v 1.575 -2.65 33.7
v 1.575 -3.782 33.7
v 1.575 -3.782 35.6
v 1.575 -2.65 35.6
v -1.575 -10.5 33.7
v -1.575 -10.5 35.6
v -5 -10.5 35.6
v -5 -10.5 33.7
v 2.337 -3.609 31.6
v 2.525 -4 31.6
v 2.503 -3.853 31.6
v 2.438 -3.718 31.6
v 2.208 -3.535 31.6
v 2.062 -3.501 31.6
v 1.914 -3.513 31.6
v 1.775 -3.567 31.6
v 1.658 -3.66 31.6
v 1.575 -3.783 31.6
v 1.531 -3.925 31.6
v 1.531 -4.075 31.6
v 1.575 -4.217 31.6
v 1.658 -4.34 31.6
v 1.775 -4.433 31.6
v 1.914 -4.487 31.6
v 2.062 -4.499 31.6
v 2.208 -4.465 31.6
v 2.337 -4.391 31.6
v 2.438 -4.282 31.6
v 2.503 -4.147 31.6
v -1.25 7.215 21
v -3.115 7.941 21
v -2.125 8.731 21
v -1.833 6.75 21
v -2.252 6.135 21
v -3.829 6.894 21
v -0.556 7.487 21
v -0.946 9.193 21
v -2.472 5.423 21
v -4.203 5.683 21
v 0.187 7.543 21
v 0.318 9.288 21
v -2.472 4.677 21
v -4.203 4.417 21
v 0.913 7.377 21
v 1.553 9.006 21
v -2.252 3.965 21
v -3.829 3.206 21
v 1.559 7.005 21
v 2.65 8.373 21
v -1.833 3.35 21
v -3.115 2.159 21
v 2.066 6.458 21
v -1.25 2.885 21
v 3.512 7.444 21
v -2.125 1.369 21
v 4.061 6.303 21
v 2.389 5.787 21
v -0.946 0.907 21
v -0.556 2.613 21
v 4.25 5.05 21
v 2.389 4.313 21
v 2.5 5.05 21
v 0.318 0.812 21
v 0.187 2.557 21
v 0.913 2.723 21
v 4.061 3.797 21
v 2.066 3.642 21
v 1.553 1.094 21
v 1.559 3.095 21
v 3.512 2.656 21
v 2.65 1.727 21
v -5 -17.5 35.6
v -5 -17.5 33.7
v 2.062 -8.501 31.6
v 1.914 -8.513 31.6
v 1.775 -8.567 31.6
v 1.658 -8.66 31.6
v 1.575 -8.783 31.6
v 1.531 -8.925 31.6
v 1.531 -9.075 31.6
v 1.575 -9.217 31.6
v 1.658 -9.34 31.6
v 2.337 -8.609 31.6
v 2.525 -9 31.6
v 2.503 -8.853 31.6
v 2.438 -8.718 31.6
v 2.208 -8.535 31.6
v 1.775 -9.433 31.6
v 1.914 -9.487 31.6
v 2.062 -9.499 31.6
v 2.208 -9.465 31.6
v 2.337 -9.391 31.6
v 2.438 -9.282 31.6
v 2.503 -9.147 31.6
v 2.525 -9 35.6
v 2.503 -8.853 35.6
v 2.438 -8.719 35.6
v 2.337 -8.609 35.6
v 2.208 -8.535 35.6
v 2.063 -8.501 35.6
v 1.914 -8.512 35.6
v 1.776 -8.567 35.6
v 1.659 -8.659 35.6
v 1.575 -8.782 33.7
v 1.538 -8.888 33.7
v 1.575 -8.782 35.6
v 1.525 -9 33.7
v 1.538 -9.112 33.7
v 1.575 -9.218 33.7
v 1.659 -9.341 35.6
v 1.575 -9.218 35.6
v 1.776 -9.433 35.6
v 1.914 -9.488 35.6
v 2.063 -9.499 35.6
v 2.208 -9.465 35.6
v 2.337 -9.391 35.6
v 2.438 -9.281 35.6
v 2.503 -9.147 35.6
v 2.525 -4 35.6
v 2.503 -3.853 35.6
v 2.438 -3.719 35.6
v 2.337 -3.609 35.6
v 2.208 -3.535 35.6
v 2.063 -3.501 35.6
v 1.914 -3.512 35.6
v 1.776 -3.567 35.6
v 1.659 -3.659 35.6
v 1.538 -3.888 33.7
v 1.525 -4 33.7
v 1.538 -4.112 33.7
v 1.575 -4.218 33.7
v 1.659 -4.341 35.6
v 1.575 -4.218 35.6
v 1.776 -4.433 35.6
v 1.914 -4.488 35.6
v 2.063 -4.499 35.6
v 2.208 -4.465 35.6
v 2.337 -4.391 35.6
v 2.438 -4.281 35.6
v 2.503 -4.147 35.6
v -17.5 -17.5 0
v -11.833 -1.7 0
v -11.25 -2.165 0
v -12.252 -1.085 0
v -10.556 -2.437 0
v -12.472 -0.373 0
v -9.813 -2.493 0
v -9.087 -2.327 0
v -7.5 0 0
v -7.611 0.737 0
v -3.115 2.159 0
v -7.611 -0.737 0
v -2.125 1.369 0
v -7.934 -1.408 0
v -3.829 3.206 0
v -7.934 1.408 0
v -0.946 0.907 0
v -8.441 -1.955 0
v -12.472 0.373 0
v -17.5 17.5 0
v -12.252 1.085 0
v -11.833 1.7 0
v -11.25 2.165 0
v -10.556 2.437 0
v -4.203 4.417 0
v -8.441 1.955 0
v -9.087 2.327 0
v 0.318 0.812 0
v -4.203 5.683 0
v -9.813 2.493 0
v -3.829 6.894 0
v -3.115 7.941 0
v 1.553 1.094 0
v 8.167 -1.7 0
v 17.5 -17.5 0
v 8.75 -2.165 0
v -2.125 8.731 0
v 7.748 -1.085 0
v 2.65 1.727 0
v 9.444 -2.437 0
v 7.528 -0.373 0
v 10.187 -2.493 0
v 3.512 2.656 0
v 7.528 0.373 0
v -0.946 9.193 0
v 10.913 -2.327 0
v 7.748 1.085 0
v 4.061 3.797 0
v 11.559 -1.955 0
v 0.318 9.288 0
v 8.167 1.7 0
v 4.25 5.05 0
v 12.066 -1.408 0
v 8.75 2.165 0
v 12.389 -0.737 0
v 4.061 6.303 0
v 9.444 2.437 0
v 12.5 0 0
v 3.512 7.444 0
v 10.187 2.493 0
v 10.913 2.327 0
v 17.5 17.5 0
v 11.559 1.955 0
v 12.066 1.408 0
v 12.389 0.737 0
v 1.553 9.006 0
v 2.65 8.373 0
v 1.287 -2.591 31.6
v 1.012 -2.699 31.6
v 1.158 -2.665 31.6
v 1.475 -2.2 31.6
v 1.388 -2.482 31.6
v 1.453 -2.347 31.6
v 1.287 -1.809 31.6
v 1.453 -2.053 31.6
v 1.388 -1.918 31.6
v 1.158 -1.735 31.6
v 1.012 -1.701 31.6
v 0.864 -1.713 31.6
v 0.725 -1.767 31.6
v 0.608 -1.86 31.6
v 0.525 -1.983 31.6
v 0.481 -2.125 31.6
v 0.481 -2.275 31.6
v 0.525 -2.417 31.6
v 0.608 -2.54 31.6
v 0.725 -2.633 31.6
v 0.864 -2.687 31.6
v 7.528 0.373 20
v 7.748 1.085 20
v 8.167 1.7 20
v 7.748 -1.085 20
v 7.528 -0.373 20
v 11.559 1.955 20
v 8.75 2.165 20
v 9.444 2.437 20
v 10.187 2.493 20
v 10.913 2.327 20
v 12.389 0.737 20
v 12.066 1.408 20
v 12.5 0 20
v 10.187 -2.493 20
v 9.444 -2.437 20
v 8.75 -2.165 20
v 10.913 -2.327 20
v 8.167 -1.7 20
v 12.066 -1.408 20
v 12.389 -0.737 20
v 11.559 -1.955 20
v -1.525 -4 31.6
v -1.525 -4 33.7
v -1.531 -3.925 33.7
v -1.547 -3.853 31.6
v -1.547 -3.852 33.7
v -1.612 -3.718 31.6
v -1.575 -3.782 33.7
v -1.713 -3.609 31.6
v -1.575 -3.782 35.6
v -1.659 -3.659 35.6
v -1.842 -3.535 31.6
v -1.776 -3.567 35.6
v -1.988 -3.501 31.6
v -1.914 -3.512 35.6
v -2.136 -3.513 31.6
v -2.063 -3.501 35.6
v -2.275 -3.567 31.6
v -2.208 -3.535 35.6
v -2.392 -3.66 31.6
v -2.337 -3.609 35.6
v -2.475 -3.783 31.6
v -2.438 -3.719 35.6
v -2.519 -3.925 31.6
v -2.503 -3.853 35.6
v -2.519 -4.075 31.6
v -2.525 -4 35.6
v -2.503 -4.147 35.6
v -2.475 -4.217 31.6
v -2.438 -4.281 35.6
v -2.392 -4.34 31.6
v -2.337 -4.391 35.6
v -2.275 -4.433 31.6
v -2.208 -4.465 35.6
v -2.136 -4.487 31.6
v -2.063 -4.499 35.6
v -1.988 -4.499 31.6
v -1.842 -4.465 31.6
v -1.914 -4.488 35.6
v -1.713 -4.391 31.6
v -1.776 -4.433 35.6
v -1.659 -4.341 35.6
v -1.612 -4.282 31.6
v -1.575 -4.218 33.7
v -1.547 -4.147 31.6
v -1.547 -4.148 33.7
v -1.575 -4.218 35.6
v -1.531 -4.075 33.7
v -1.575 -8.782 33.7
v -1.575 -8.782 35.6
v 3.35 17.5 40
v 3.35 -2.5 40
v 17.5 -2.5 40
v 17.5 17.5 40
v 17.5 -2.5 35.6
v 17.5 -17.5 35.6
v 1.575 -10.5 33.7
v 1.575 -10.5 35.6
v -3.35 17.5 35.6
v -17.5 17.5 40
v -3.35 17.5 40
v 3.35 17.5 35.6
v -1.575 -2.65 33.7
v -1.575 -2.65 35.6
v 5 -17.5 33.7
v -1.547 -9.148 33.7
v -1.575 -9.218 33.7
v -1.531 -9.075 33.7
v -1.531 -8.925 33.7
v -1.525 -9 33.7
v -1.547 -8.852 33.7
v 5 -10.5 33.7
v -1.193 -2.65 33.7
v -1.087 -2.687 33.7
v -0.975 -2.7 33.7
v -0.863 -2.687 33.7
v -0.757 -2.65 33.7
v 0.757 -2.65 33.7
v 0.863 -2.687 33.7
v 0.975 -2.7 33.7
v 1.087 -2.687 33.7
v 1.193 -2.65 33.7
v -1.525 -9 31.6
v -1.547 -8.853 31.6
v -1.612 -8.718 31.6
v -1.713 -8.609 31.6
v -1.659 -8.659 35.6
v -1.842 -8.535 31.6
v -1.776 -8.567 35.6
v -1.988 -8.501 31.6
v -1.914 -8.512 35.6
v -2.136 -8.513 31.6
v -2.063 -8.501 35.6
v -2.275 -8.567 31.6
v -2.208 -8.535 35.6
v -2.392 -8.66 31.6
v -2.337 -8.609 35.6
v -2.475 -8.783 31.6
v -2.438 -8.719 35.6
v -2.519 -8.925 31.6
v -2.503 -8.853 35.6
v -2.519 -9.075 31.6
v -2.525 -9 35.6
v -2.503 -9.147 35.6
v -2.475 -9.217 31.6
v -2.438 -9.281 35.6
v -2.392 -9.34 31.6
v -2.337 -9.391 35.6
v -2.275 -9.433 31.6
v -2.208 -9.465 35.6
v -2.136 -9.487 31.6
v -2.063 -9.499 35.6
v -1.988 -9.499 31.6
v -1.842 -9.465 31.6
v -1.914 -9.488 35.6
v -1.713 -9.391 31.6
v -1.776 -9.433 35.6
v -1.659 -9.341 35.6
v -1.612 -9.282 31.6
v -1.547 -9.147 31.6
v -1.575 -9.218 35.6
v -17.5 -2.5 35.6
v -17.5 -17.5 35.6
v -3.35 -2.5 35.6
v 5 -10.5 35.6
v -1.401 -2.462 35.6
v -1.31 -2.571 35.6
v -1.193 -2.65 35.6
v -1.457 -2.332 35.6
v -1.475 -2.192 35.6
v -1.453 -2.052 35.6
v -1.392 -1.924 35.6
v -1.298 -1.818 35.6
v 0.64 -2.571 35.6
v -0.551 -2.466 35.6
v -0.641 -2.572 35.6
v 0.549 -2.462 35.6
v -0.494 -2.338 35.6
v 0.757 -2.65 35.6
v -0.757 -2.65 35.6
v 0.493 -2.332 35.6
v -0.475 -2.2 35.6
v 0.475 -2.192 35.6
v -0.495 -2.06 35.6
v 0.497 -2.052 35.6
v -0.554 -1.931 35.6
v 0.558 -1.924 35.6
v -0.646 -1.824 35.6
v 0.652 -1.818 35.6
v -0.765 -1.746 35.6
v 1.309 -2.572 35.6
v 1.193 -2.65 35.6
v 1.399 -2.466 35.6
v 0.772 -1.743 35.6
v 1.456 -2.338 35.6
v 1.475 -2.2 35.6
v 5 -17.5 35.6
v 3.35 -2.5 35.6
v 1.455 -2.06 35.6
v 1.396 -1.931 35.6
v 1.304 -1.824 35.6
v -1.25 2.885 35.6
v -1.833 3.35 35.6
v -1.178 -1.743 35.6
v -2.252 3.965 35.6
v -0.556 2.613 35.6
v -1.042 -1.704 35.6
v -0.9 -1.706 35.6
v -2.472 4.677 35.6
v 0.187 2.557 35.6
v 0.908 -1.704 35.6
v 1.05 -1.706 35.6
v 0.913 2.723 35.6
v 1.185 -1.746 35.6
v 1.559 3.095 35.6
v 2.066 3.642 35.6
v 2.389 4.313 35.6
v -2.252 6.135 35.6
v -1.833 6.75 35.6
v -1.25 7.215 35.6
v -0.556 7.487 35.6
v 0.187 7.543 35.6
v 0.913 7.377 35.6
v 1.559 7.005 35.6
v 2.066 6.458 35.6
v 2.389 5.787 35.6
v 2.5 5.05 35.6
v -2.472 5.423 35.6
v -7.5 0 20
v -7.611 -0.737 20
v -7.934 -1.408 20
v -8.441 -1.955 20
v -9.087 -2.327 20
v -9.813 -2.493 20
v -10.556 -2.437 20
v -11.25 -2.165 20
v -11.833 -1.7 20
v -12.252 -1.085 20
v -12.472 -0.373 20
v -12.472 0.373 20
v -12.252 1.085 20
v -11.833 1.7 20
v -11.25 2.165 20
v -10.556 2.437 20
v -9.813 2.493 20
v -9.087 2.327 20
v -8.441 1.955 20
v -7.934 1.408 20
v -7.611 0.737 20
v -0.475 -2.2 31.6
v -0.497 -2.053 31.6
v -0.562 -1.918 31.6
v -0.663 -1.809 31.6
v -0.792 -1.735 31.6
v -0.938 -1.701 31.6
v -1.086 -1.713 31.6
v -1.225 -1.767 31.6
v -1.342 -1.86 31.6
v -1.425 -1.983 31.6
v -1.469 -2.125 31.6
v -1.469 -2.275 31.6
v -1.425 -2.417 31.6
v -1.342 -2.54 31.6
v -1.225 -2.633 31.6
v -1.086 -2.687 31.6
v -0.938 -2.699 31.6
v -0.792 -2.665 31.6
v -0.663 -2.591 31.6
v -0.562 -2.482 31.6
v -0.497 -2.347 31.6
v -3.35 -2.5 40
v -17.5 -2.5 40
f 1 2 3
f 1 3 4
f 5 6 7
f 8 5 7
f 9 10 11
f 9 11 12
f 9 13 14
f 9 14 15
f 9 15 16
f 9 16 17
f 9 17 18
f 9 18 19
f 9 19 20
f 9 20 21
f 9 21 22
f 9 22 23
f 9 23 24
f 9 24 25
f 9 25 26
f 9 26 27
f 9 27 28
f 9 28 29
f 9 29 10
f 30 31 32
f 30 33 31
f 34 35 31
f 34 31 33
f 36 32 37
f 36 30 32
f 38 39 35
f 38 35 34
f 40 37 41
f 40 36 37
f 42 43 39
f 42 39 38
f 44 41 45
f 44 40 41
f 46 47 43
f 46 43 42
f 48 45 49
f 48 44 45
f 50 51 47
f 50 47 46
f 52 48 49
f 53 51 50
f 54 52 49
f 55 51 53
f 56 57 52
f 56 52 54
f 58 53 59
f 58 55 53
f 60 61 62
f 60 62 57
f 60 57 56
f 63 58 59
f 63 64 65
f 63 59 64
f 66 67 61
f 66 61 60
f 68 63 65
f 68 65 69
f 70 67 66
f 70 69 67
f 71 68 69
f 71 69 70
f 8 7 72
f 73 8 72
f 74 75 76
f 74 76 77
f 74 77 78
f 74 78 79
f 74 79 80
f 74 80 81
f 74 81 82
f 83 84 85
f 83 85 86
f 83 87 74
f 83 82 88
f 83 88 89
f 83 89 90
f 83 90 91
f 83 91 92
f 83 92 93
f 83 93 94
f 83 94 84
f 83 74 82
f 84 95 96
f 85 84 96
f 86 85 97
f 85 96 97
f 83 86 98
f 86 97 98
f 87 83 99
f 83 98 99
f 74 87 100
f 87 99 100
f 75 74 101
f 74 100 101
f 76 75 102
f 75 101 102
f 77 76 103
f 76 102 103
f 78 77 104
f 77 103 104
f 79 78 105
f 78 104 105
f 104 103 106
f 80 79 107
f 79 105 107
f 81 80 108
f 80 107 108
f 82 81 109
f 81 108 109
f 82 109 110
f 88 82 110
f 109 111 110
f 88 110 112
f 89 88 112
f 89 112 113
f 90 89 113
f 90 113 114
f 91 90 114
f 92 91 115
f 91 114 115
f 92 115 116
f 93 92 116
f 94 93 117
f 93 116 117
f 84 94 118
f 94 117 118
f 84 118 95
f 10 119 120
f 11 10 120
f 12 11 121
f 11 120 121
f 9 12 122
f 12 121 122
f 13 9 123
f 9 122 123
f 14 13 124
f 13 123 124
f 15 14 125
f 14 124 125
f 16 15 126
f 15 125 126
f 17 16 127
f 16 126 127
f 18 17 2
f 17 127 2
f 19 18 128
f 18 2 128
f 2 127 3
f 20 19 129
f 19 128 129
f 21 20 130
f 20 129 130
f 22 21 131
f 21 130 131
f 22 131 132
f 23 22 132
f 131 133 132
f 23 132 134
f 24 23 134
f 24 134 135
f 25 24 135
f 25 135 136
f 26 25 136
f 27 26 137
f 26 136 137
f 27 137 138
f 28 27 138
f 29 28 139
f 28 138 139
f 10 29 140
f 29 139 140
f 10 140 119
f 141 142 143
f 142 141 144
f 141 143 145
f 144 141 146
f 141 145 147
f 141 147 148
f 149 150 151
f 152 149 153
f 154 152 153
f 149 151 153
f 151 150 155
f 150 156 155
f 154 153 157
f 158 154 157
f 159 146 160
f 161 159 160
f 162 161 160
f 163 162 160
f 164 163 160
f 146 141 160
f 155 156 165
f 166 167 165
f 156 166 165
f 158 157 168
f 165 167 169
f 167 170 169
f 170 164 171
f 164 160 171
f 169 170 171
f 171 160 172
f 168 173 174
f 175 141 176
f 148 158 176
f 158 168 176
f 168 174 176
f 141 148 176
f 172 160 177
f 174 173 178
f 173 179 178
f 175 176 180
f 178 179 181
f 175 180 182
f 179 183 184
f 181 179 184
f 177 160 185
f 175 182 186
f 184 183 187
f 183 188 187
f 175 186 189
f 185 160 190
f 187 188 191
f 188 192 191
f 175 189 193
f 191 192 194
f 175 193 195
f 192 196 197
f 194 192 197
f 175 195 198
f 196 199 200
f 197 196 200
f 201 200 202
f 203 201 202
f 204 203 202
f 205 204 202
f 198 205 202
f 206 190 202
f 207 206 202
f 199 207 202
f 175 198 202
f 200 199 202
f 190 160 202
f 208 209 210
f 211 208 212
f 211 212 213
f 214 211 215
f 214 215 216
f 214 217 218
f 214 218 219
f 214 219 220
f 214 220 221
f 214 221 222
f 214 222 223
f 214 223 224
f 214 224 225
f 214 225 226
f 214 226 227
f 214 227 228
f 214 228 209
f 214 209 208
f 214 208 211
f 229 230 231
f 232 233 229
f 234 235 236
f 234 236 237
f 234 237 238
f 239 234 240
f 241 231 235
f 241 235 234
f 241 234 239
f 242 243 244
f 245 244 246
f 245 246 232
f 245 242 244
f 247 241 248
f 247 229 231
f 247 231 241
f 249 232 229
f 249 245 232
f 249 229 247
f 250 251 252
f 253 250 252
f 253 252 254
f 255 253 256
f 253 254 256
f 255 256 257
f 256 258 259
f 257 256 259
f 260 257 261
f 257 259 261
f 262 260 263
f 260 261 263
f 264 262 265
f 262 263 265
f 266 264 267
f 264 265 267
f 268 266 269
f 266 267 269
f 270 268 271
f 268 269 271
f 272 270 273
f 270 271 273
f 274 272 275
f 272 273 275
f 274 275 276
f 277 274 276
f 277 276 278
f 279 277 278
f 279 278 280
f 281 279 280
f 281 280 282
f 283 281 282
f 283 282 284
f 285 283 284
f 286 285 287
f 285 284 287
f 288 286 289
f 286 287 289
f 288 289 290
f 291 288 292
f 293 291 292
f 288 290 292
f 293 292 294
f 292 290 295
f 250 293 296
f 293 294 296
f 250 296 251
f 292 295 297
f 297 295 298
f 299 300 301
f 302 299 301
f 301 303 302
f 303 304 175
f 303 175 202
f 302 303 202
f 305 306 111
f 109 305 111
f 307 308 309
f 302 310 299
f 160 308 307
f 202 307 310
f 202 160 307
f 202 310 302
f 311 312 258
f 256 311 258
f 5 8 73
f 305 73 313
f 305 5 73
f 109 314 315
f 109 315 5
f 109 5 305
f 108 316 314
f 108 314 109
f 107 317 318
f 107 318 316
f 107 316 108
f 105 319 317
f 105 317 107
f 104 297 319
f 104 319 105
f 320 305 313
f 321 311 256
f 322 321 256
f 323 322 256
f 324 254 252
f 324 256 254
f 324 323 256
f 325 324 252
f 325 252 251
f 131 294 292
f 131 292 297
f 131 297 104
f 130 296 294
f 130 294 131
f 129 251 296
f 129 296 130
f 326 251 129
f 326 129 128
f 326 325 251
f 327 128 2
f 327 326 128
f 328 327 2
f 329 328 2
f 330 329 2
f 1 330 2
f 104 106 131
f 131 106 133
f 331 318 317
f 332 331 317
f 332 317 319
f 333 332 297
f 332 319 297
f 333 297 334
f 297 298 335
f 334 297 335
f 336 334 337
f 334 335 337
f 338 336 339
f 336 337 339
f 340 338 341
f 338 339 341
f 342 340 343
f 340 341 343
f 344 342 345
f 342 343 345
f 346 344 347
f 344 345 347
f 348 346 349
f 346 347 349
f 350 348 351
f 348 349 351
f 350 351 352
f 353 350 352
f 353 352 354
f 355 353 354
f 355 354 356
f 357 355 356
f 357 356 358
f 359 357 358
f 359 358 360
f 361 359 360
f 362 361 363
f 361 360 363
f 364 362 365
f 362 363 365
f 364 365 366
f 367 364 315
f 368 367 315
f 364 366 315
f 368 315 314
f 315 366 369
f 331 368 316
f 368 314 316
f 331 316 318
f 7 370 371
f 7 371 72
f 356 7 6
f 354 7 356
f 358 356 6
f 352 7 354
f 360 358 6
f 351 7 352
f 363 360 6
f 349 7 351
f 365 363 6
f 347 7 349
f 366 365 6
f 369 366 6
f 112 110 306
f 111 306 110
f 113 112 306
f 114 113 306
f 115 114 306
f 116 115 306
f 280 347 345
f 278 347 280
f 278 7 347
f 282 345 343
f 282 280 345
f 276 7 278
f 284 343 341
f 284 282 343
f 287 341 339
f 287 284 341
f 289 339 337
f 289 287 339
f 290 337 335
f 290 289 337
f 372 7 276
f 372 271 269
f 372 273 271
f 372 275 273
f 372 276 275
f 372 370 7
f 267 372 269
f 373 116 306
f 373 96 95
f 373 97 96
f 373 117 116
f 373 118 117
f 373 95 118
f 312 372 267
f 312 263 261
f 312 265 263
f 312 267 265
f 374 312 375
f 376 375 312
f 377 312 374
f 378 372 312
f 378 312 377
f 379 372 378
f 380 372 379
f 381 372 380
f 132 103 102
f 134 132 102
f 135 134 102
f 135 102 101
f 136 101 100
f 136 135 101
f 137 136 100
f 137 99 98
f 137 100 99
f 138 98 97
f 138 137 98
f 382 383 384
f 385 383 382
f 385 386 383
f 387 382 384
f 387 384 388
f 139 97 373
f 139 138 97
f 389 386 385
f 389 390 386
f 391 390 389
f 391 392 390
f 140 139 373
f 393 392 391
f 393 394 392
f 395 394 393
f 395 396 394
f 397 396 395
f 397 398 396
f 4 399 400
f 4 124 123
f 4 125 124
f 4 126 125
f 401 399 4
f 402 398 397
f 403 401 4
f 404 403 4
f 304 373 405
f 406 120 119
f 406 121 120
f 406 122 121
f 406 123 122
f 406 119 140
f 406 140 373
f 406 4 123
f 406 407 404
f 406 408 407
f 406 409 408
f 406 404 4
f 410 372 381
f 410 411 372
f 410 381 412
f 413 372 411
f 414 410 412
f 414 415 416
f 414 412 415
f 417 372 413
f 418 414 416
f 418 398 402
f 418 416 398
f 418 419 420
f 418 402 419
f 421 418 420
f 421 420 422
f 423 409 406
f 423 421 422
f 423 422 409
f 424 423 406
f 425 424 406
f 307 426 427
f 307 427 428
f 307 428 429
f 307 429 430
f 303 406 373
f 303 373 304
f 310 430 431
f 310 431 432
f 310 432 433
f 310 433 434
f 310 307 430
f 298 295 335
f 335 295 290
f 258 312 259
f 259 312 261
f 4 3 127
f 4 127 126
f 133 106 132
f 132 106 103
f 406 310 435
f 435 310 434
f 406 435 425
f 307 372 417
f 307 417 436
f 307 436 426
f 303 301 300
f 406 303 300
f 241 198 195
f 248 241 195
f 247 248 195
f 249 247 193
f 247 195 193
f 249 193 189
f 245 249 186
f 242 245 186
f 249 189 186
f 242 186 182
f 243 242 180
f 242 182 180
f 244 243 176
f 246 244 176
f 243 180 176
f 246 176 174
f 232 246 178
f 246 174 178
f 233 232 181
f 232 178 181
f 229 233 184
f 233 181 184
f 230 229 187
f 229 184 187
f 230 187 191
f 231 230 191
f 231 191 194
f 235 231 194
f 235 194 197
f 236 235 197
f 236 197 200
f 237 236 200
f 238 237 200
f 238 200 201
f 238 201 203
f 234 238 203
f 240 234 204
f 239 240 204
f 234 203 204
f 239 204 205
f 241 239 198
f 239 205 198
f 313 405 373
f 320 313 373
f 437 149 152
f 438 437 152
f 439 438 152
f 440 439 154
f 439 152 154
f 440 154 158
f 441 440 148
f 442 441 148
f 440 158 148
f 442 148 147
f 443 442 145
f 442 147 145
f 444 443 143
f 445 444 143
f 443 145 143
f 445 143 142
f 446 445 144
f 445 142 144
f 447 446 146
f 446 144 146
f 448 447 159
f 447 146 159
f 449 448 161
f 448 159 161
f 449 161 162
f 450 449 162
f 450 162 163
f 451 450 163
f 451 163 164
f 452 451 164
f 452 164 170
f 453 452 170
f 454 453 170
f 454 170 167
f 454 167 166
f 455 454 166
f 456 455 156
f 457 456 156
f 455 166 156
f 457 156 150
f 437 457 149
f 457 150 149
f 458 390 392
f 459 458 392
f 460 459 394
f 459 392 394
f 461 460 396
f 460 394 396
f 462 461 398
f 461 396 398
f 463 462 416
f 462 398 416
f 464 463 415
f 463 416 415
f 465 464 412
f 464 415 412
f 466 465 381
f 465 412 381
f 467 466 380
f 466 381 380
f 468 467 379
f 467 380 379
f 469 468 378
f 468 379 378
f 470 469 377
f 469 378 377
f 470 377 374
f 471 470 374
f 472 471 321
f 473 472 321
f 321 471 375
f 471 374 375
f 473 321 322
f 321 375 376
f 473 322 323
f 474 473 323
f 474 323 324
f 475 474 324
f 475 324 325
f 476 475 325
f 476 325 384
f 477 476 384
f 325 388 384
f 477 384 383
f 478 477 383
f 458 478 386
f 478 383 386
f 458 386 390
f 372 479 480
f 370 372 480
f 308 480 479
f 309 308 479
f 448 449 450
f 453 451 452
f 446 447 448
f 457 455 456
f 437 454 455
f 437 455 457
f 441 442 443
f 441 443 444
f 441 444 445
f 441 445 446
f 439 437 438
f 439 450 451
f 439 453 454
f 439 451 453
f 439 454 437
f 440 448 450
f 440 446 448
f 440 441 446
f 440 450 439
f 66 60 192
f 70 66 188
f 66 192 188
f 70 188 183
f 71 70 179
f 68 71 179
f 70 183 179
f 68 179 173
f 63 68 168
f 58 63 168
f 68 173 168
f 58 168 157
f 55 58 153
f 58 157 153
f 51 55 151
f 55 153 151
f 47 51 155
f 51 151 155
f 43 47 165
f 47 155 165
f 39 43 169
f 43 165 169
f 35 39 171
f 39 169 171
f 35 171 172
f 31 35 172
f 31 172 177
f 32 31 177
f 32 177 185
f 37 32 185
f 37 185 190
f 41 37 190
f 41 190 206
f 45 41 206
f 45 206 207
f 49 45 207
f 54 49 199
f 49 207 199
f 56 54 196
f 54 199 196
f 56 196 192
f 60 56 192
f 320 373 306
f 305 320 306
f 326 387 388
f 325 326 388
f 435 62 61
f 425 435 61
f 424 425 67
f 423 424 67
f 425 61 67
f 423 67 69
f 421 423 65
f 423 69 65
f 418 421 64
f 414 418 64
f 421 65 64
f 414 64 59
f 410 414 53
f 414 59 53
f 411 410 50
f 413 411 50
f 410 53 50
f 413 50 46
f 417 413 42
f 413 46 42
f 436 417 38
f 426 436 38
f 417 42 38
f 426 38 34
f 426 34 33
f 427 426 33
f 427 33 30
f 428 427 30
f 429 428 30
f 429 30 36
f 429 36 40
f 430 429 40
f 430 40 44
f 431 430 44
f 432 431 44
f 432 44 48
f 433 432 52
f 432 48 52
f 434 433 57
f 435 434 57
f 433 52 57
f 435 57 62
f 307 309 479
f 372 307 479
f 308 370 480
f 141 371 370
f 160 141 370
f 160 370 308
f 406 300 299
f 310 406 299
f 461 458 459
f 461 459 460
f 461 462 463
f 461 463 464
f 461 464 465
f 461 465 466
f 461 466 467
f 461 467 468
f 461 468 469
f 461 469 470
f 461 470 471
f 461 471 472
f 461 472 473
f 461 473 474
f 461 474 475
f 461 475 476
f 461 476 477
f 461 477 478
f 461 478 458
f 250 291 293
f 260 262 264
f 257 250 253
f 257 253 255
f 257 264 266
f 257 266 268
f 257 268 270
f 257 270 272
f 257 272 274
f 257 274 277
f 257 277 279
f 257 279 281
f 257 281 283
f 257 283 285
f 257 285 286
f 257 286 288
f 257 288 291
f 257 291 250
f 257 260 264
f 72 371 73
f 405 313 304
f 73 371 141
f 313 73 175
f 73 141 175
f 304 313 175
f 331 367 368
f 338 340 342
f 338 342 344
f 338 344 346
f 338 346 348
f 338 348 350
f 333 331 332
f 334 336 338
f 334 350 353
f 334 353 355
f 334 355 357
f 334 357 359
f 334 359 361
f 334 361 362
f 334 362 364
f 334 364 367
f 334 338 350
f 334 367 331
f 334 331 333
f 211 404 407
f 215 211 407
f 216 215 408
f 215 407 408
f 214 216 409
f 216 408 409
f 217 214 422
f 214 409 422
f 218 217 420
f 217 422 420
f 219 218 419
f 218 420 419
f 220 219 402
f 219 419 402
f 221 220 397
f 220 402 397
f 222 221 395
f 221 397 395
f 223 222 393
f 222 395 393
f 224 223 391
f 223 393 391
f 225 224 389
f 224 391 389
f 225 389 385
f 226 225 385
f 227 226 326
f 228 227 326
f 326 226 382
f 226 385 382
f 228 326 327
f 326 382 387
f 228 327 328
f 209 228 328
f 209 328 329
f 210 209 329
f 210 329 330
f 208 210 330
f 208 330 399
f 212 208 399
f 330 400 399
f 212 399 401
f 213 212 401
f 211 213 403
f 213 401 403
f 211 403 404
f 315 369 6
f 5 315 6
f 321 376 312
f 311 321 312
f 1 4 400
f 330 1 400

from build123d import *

# Parameters (mm, degrees)
F0_W      = 35
F0_H      = 35
F1_DEPTH  = 40
F2_R      = 2.5
F3_DEPTH  = 20
F5_DEPTH  = 4.4
F6_R      = 4.25
F7_DEPTH  = 21
F8_R      = 2.5
F9_DEPTH  = 14.6
F11_DEPTH = 1.9
F12_R     = 0.5
F13_DEPTH = 4


with BuildPart() as f1:
    # F0 (on Top) → F1 (new body)
    with BuildSketch(Plane.XY):
        Rectangle(F0_W, F0_H)
    extrude(amount=F1_DEPTH)

    # F2 (on face) → F3 (cut)
    with BuildSketch(Plane(origin=(0, 0, 0), x_dir=(1, 0, 0), z_dir=(0, 0, -1))):
        with Locations((-10, 0)):
            Circle(F2_R)
        with Locations((10, 0)):
            Circle(F2_R)
    extrude(amount=-F3_DEPTH, mode=Mode.SUBTRACT)

    # F4 (on face) → F5 (cut)
    with BuildSketch(Plane.XY.offset(40)):
        Polygon((-17.5, -17.5), (17.5, -17.5), (17.5, -2.5), (3.35, -2.5), (3.35, 17.5), (-3.35, 17.5), (-3.35, -2.5), (-17.5, -2.5), align=None)
    extrude(amount=-F5_DEPTH, mode=Mode.SUBTRACT)

    # F6 (on face) → F7 (cut)
    with BuildSketch(Plane(origin=(0, 0, 0), x_dir=(1, 0, 0), z_dir=(0, 0, -1))):
        with Locations((0, -5.05)):
            Circle(F6_R)
    extrude(amount=-F7_DEPTH, mode=Mode.SUBTRACT)

    # F8 (on face) → F9 (cut, through all)
    with BuildSketch(Plane(origin=(0, 0, 21), x_dir=(1, 0, 0), z_dir=(0, 0, -1))):
        with Locations((0, -5.05)):
            Circle(F8_R)
    extrude(amount=-F9_DEPTH, mode=Mode.SUBTRACT)

    # F10 (on face) → F11 (cut)
    with BuildSketch(Plane.XY.offset(35.6)):
        Polygon((-5, -17.5), (5, -17.5), (5, -10.5), (1.575, -10.5), (1.575, -2.65), (-1.575, -2.65), (-1.575, -10.5), (-5, -10.5), align=None)
    extrude(amount=-F11_DEPTH, mode=Mode.SUBTRACT)

    # F12 (on face) → F13 (cut)
    with BuildSketch(Plane.XY.offset(35.6)):
        with Locations((-2.025, -9)):
            Circle(F12_R)
        with Locations((-2.025, -4)):
            Circle(F12_R)
        with Locations((2.025, -9)):
            Circle(F12_R)
        with Locations((2.025, -4)):
            Circle(F12_R)
        with Locations((-0.975, -2.2)):
            Circle(F12_R)
        with Locations((0.975, -2.2)):
            Circle(F12_R)
    extrude(amount=-F13_DEPTH, mode=Mode.SUBTRACT)


solid = f1.part
